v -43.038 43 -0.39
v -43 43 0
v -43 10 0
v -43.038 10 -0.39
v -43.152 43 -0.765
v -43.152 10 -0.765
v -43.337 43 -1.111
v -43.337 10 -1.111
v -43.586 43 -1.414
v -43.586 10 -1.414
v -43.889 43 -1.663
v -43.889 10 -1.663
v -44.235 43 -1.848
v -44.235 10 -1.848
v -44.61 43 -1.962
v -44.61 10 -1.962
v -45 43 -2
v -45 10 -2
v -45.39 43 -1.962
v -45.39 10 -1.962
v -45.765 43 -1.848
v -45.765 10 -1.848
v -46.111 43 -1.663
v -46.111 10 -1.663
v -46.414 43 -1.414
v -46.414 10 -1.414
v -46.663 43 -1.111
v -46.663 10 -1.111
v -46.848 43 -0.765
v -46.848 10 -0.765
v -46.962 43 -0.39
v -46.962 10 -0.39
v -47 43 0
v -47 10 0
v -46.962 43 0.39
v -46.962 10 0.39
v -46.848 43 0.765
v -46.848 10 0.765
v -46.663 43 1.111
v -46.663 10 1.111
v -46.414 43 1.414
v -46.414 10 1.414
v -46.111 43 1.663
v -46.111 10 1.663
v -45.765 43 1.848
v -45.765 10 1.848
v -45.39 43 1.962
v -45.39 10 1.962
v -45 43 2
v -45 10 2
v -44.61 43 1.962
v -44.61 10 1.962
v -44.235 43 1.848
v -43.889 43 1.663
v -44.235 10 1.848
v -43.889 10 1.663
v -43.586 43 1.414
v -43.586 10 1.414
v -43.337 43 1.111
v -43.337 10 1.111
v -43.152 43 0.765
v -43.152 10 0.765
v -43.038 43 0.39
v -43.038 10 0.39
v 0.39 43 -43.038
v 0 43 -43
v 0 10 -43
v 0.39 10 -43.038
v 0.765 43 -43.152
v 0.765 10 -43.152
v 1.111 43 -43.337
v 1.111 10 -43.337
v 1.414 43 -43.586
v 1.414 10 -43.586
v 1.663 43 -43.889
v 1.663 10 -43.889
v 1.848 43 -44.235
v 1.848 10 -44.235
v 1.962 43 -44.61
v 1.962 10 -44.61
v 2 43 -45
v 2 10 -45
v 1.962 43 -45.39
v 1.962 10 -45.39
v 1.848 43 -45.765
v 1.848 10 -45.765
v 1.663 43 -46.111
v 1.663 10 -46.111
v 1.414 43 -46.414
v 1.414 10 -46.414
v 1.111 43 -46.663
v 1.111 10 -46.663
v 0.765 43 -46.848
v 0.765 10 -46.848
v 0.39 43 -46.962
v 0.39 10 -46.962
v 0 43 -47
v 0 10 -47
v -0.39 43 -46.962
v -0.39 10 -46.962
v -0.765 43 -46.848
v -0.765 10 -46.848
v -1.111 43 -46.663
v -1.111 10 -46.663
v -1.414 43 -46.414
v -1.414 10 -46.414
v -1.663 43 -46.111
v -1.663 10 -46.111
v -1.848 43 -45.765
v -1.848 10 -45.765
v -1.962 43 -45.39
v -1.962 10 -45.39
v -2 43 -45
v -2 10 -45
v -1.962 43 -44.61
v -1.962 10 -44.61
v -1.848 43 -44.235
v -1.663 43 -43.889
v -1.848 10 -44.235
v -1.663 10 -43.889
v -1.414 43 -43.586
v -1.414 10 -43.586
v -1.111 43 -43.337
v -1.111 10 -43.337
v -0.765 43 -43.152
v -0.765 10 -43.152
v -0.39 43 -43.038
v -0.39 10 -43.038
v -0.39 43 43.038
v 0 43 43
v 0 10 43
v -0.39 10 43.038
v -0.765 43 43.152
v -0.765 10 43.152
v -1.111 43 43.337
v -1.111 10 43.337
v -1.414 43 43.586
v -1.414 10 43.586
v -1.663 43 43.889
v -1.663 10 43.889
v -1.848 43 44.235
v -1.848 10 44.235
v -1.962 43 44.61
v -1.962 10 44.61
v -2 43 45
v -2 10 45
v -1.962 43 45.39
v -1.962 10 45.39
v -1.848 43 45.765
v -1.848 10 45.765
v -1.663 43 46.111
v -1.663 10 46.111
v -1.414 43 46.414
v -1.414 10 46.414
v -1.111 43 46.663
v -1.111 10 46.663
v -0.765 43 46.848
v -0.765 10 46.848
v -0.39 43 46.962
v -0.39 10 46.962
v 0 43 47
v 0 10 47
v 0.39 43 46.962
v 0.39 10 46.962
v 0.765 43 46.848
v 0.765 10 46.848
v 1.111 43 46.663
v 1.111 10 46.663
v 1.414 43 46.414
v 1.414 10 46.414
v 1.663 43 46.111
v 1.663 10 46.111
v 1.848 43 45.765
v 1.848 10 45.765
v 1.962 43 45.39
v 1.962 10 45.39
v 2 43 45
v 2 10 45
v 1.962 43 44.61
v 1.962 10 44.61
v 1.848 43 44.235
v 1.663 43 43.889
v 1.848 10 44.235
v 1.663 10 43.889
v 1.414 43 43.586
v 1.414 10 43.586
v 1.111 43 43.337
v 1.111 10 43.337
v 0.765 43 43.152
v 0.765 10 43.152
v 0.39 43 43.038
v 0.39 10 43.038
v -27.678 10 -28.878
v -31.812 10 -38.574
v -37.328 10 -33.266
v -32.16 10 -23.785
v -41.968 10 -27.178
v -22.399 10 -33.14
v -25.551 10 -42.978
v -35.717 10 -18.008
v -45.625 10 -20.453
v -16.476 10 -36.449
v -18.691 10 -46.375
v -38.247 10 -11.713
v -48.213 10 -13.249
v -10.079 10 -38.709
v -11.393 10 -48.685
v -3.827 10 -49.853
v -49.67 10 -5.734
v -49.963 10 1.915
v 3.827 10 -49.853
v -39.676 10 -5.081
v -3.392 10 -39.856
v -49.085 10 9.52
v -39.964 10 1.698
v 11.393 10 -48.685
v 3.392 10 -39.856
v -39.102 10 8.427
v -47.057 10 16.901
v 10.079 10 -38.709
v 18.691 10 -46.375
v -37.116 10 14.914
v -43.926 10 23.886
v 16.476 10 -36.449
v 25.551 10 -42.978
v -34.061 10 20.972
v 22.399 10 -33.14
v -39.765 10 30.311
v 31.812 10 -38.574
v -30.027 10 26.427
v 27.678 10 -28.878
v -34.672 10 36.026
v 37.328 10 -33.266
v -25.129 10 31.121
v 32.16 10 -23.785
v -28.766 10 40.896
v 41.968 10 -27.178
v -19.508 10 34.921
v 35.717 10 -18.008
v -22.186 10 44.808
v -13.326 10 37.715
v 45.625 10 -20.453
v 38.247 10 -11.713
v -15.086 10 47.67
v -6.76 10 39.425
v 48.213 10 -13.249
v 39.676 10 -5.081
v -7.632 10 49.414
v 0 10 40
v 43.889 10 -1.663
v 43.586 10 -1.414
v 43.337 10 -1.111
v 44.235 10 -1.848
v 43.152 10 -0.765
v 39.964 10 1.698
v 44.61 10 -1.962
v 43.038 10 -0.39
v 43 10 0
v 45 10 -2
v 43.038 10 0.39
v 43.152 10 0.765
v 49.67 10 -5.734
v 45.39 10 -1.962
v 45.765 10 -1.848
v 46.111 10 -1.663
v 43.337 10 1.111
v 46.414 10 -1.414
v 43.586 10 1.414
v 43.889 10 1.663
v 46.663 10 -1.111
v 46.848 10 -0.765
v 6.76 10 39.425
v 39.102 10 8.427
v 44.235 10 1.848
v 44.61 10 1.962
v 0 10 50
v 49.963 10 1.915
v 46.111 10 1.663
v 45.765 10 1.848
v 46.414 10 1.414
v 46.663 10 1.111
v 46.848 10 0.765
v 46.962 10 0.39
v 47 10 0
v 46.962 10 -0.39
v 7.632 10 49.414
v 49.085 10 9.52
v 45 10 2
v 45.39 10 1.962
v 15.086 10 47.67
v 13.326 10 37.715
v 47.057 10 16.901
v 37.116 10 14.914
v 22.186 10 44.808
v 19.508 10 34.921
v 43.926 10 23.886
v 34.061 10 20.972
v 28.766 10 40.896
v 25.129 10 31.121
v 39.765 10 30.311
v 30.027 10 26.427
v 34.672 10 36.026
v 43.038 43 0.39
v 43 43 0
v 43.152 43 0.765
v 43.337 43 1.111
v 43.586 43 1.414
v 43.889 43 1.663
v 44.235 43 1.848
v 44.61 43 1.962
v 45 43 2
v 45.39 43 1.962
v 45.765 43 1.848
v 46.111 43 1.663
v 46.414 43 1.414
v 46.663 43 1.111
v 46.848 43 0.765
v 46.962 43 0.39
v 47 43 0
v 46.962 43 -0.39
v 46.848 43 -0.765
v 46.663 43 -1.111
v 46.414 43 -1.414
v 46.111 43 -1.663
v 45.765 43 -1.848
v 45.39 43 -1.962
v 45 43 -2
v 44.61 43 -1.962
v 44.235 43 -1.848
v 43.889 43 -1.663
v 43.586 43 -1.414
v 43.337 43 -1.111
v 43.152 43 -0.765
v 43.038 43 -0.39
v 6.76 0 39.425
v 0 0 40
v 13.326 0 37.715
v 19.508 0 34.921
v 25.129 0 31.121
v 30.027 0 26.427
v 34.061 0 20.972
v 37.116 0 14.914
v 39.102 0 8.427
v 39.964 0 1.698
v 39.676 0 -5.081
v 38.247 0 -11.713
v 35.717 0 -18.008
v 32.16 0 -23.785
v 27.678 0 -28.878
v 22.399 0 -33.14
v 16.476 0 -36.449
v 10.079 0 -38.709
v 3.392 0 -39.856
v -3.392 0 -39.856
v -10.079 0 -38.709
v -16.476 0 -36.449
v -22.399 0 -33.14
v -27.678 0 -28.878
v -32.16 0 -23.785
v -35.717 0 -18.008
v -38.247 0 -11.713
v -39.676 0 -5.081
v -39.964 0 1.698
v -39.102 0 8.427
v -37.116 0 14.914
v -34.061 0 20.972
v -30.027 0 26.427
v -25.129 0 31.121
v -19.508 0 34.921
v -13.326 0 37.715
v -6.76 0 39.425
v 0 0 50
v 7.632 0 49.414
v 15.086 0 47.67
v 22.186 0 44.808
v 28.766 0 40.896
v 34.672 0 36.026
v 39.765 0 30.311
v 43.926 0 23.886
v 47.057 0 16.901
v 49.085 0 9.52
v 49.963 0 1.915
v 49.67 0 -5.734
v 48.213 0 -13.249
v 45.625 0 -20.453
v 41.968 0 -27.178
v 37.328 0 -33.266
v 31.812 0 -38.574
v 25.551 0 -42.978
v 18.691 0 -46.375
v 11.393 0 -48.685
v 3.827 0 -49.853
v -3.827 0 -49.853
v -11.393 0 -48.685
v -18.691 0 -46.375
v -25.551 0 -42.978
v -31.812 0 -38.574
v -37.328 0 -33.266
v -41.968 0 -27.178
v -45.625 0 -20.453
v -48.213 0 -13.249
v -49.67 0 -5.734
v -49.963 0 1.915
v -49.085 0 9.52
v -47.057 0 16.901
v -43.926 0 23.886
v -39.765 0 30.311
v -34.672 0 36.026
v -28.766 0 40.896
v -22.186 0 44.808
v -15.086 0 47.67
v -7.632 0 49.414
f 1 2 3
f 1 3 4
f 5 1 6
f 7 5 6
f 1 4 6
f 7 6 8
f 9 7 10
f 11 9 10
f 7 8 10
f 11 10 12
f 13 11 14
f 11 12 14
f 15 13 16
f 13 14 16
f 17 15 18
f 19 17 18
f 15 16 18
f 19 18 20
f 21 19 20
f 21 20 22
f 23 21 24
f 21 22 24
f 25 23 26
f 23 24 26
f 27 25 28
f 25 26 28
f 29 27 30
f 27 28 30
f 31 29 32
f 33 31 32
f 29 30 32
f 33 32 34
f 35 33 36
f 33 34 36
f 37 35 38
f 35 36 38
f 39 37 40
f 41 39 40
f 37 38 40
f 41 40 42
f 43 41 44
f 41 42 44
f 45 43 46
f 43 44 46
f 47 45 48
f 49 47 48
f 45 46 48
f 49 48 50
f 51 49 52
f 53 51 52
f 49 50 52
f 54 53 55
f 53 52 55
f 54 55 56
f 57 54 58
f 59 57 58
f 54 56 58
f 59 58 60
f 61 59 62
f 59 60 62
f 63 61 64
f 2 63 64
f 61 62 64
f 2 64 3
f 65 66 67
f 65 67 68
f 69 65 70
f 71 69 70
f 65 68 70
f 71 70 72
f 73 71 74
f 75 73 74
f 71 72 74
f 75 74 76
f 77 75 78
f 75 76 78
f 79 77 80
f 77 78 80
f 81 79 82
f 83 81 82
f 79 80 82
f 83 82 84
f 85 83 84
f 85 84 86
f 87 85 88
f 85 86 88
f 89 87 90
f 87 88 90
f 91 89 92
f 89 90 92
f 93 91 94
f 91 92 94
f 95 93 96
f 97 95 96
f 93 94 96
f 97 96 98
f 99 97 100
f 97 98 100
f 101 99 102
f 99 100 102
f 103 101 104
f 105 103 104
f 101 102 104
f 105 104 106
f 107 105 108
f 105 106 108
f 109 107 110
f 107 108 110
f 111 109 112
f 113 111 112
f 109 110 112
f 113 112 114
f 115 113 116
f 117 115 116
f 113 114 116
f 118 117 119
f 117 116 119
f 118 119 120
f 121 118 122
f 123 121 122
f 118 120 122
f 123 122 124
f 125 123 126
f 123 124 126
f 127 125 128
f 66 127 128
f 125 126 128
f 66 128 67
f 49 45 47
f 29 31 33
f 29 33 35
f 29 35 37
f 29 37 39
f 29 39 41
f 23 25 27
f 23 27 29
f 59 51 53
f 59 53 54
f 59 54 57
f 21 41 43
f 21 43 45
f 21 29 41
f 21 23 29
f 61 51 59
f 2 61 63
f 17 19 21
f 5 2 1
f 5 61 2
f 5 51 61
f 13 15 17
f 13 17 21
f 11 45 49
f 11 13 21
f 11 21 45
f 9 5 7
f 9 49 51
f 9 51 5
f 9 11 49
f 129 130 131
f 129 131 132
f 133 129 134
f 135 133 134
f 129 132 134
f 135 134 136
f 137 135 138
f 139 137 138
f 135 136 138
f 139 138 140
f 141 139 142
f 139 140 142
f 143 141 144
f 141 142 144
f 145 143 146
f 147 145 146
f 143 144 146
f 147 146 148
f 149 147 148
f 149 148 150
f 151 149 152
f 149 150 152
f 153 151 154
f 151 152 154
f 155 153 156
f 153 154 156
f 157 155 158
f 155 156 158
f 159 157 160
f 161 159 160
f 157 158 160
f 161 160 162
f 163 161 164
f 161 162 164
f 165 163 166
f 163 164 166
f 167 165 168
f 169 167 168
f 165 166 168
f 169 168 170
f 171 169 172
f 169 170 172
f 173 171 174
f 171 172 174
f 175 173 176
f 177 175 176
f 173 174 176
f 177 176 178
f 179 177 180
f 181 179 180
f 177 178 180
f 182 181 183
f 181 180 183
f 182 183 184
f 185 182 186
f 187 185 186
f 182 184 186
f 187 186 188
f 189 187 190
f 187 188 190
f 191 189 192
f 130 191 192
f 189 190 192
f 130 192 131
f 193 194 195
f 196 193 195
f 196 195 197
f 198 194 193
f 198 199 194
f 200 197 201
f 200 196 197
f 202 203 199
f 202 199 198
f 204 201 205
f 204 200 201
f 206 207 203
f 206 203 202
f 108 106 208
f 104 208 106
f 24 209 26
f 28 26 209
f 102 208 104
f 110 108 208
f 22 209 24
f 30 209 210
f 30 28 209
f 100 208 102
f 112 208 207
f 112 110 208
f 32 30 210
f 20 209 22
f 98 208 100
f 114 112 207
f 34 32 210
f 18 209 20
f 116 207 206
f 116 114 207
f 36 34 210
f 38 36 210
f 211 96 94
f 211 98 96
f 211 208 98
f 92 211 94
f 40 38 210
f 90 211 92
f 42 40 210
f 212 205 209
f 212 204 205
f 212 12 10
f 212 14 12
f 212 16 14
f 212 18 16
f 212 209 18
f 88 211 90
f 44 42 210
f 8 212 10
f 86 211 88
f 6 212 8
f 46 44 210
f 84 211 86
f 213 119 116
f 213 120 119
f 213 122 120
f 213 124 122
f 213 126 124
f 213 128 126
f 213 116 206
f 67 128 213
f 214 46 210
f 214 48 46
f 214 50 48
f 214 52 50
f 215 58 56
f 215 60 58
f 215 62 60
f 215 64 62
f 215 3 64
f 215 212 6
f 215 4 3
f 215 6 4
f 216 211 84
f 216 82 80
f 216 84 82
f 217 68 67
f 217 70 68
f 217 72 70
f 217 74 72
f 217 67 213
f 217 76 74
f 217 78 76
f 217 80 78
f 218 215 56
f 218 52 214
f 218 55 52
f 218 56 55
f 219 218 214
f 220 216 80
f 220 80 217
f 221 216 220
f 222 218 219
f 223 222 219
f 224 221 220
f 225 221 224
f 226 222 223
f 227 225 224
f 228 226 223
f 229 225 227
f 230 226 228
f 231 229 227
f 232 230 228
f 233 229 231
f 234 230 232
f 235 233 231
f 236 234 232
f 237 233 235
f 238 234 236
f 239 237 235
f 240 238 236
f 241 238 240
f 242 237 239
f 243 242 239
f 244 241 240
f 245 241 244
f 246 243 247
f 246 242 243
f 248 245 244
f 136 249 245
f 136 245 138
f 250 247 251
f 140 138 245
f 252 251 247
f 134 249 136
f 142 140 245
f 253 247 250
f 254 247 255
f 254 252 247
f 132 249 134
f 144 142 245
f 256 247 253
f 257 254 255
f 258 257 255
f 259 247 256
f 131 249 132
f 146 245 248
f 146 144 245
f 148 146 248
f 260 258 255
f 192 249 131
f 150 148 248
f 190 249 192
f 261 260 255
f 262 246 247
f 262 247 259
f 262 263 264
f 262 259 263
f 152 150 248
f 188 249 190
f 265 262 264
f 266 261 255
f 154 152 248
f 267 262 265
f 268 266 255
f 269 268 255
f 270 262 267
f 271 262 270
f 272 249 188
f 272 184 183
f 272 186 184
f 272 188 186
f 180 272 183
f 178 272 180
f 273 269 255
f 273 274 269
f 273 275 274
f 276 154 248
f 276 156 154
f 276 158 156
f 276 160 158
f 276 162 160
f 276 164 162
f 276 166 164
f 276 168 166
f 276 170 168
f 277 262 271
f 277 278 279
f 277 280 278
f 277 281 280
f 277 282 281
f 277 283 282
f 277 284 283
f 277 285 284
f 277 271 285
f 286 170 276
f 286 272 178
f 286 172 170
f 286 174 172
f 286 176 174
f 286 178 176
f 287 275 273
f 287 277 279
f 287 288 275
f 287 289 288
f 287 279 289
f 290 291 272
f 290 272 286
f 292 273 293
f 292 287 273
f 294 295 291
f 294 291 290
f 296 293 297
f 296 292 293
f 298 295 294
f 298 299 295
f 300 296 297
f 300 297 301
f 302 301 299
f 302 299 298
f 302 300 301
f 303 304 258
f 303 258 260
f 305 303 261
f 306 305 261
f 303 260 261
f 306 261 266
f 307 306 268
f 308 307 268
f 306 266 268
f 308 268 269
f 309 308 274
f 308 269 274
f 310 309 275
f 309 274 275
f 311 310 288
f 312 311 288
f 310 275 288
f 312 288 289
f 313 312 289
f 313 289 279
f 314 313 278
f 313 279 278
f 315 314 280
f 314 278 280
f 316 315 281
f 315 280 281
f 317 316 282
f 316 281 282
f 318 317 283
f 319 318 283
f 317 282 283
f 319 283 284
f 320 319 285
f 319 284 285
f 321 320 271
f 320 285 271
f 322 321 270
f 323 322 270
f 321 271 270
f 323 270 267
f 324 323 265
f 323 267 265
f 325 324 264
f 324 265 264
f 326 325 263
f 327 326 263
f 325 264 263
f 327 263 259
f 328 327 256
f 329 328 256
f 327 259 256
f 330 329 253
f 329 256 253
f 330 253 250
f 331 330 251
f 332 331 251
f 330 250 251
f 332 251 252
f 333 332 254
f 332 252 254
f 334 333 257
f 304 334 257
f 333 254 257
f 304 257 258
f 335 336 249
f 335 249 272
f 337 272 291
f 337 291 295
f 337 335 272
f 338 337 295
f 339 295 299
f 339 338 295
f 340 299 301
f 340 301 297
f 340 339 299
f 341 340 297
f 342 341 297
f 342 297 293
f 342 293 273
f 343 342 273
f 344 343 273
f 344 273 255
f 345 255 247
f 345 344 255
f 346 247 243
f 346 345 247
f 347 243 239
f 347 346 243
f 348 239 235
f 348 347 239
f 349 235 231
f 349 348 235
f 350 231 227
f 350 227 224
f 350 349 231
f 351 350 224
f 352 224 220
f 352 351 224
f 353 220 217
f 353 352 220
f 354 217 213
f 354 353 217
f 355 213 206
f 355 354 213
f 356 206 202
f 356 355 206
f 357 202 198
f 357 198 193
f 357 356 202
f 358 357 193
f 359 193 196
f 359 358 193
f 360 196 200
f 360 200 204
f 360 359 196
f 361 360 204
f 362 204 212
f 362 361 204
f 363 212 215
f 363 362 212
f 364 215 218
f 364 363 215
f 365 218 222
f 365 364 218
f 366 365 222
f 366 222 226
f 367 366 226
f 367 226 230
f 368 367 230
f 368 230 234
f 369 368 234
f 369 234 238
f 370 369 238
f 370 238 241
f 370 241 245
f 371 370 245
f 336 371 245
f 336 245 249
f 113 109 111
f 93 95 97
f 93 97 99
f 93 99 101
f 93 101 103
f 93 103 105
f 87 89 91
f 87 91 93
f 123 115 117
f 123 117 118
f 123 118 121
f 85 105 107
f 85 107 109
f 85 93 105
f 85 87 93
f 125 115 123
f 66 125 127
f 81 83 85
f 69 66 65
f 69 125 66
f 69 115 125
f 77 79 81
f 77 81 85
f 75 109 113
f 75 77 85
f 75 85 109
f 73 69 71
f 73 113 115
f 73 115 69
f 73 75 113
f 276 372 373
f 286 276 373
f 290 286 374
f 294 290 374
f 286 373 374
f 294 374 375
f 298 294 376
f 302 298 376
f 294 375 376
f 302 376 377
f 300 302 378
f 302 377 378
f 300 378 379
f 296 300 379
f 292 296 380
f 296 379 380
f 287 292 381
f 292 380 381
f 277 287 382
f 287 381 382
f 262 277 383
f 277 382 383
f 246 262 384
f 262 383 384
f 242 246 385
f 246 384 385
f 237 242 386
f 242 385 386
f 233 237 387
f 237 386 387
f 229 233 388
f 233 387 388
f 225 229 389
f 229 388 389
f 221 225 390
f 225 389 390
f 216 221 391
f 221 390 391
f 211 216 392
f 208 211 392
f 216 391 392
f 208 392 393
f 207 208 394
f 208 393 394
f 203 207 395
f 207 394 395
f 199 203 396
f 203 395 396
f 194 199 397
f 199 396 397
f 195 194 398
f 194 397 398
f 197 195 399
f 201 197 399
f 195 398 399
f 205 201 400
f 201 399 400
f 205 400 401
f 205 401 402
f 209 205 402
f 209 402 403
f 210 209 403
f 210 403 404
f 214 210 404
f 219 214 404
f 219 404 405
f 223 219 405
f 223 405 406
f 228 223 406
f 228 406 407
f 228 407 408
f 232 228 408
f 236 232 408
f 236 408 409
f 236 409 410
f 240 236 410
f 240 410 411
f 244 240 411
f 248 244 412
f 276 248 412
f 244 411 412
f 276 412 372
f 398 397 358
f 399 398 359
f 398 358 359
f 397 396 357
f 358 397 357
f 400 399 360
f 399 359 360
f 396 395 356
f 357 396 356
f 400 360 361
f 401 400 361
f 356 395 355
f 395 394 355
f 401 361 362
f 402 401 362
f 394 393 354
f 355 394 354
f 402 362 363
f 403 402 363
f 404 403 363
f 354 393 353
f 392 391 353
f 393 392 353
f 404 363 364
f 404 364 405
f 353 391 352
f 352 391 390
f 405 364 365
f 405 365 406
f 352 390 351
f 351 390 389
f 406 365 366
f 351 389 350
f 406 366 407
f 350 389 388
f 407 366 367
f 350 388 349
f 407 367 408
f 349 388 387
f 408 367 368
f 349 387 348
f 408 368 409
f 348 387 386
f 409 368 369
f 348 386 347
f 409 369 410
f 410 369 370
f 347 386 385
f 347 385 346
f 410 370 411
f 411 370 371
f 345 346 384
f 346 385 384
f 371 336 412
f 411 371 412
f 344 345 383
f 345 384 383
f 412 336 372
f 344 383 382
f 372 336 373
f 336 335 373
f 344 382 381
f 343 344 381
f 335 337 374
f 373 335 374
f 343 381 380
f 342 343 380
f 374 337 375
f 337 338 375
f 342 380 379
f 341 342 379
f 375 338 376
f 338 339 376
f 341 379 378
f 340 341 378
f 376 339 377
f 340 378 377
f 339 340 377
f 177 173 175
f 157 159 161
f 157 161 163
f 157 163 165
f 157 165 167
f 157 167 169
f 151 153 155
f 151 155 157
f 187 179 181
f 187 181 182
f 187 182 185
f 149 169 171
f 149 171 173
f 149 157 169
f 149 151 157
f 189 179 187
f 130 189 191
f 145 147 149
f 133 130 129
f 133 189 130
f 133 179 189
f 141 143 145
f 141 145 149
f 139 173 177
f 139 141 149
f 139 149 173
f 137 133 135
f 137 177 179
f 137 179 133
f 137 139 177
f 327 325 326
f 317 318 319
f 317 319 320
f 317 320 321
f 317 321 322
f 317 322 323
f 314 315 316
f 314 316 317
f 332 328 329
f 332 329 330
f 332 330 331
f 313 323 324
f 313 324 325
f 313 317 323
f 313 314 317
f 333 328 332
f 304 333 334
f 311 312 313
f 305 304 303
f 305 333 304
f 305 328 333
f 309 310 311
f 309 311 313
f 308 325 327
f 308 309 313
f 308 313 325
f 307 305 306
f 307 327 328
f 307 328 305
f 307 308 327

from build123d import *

# Parameters (mm, degrees)
SKETCH1_R           = 50
SKETCH1_R_2         = 40
BOSS_EXTRUDE1_DEPTH = 10
SKETCH2_R           = 2
BOSS_EXTRUDE2_DEPTH = 33
CIRPATTERN1_COUNT   = 4


with BuildPart() as part:
    # Sketch1 → Boss-Extrude1 (new body)
    with BuildSketch(Plane(origin=(0, 0, 0), x_dir=(1, 0, 0), z_dir=(0, 1, 0))):
        Circle(SKETCH1_R)
        Circle(SKETCH1_R_2, mode=Mode.SUBTRACT)
    extrude(amount=BOSS_EXTRUDE1_DEPTH)

    # Sketch2 → Boss-Extrude2 (add)
    with BuildSketch(Plane(origin=(0, 10, 0), x_dir=(1, 0, 0), z_dir=(0, 1, 0))):
        with Locations((0, 45)):
            Circle(SKETCH2_R)
    boss_extrude2 = extrude(amount=BOSS_EXTRUDE2_DEPTH)

    # CirPattern1: Boss-Extrude2 ×4 about axis
    cirpattern1_axis = Axis((0, 10, 0), (0, 1, 0))
    for i in range(1, CIRPATTERN1_COUNT):
        add(boss_extrude2.rotate(cirpattern1_axis, i * 360 / CIRPATTERN1_COUNT))


solid = part.part
